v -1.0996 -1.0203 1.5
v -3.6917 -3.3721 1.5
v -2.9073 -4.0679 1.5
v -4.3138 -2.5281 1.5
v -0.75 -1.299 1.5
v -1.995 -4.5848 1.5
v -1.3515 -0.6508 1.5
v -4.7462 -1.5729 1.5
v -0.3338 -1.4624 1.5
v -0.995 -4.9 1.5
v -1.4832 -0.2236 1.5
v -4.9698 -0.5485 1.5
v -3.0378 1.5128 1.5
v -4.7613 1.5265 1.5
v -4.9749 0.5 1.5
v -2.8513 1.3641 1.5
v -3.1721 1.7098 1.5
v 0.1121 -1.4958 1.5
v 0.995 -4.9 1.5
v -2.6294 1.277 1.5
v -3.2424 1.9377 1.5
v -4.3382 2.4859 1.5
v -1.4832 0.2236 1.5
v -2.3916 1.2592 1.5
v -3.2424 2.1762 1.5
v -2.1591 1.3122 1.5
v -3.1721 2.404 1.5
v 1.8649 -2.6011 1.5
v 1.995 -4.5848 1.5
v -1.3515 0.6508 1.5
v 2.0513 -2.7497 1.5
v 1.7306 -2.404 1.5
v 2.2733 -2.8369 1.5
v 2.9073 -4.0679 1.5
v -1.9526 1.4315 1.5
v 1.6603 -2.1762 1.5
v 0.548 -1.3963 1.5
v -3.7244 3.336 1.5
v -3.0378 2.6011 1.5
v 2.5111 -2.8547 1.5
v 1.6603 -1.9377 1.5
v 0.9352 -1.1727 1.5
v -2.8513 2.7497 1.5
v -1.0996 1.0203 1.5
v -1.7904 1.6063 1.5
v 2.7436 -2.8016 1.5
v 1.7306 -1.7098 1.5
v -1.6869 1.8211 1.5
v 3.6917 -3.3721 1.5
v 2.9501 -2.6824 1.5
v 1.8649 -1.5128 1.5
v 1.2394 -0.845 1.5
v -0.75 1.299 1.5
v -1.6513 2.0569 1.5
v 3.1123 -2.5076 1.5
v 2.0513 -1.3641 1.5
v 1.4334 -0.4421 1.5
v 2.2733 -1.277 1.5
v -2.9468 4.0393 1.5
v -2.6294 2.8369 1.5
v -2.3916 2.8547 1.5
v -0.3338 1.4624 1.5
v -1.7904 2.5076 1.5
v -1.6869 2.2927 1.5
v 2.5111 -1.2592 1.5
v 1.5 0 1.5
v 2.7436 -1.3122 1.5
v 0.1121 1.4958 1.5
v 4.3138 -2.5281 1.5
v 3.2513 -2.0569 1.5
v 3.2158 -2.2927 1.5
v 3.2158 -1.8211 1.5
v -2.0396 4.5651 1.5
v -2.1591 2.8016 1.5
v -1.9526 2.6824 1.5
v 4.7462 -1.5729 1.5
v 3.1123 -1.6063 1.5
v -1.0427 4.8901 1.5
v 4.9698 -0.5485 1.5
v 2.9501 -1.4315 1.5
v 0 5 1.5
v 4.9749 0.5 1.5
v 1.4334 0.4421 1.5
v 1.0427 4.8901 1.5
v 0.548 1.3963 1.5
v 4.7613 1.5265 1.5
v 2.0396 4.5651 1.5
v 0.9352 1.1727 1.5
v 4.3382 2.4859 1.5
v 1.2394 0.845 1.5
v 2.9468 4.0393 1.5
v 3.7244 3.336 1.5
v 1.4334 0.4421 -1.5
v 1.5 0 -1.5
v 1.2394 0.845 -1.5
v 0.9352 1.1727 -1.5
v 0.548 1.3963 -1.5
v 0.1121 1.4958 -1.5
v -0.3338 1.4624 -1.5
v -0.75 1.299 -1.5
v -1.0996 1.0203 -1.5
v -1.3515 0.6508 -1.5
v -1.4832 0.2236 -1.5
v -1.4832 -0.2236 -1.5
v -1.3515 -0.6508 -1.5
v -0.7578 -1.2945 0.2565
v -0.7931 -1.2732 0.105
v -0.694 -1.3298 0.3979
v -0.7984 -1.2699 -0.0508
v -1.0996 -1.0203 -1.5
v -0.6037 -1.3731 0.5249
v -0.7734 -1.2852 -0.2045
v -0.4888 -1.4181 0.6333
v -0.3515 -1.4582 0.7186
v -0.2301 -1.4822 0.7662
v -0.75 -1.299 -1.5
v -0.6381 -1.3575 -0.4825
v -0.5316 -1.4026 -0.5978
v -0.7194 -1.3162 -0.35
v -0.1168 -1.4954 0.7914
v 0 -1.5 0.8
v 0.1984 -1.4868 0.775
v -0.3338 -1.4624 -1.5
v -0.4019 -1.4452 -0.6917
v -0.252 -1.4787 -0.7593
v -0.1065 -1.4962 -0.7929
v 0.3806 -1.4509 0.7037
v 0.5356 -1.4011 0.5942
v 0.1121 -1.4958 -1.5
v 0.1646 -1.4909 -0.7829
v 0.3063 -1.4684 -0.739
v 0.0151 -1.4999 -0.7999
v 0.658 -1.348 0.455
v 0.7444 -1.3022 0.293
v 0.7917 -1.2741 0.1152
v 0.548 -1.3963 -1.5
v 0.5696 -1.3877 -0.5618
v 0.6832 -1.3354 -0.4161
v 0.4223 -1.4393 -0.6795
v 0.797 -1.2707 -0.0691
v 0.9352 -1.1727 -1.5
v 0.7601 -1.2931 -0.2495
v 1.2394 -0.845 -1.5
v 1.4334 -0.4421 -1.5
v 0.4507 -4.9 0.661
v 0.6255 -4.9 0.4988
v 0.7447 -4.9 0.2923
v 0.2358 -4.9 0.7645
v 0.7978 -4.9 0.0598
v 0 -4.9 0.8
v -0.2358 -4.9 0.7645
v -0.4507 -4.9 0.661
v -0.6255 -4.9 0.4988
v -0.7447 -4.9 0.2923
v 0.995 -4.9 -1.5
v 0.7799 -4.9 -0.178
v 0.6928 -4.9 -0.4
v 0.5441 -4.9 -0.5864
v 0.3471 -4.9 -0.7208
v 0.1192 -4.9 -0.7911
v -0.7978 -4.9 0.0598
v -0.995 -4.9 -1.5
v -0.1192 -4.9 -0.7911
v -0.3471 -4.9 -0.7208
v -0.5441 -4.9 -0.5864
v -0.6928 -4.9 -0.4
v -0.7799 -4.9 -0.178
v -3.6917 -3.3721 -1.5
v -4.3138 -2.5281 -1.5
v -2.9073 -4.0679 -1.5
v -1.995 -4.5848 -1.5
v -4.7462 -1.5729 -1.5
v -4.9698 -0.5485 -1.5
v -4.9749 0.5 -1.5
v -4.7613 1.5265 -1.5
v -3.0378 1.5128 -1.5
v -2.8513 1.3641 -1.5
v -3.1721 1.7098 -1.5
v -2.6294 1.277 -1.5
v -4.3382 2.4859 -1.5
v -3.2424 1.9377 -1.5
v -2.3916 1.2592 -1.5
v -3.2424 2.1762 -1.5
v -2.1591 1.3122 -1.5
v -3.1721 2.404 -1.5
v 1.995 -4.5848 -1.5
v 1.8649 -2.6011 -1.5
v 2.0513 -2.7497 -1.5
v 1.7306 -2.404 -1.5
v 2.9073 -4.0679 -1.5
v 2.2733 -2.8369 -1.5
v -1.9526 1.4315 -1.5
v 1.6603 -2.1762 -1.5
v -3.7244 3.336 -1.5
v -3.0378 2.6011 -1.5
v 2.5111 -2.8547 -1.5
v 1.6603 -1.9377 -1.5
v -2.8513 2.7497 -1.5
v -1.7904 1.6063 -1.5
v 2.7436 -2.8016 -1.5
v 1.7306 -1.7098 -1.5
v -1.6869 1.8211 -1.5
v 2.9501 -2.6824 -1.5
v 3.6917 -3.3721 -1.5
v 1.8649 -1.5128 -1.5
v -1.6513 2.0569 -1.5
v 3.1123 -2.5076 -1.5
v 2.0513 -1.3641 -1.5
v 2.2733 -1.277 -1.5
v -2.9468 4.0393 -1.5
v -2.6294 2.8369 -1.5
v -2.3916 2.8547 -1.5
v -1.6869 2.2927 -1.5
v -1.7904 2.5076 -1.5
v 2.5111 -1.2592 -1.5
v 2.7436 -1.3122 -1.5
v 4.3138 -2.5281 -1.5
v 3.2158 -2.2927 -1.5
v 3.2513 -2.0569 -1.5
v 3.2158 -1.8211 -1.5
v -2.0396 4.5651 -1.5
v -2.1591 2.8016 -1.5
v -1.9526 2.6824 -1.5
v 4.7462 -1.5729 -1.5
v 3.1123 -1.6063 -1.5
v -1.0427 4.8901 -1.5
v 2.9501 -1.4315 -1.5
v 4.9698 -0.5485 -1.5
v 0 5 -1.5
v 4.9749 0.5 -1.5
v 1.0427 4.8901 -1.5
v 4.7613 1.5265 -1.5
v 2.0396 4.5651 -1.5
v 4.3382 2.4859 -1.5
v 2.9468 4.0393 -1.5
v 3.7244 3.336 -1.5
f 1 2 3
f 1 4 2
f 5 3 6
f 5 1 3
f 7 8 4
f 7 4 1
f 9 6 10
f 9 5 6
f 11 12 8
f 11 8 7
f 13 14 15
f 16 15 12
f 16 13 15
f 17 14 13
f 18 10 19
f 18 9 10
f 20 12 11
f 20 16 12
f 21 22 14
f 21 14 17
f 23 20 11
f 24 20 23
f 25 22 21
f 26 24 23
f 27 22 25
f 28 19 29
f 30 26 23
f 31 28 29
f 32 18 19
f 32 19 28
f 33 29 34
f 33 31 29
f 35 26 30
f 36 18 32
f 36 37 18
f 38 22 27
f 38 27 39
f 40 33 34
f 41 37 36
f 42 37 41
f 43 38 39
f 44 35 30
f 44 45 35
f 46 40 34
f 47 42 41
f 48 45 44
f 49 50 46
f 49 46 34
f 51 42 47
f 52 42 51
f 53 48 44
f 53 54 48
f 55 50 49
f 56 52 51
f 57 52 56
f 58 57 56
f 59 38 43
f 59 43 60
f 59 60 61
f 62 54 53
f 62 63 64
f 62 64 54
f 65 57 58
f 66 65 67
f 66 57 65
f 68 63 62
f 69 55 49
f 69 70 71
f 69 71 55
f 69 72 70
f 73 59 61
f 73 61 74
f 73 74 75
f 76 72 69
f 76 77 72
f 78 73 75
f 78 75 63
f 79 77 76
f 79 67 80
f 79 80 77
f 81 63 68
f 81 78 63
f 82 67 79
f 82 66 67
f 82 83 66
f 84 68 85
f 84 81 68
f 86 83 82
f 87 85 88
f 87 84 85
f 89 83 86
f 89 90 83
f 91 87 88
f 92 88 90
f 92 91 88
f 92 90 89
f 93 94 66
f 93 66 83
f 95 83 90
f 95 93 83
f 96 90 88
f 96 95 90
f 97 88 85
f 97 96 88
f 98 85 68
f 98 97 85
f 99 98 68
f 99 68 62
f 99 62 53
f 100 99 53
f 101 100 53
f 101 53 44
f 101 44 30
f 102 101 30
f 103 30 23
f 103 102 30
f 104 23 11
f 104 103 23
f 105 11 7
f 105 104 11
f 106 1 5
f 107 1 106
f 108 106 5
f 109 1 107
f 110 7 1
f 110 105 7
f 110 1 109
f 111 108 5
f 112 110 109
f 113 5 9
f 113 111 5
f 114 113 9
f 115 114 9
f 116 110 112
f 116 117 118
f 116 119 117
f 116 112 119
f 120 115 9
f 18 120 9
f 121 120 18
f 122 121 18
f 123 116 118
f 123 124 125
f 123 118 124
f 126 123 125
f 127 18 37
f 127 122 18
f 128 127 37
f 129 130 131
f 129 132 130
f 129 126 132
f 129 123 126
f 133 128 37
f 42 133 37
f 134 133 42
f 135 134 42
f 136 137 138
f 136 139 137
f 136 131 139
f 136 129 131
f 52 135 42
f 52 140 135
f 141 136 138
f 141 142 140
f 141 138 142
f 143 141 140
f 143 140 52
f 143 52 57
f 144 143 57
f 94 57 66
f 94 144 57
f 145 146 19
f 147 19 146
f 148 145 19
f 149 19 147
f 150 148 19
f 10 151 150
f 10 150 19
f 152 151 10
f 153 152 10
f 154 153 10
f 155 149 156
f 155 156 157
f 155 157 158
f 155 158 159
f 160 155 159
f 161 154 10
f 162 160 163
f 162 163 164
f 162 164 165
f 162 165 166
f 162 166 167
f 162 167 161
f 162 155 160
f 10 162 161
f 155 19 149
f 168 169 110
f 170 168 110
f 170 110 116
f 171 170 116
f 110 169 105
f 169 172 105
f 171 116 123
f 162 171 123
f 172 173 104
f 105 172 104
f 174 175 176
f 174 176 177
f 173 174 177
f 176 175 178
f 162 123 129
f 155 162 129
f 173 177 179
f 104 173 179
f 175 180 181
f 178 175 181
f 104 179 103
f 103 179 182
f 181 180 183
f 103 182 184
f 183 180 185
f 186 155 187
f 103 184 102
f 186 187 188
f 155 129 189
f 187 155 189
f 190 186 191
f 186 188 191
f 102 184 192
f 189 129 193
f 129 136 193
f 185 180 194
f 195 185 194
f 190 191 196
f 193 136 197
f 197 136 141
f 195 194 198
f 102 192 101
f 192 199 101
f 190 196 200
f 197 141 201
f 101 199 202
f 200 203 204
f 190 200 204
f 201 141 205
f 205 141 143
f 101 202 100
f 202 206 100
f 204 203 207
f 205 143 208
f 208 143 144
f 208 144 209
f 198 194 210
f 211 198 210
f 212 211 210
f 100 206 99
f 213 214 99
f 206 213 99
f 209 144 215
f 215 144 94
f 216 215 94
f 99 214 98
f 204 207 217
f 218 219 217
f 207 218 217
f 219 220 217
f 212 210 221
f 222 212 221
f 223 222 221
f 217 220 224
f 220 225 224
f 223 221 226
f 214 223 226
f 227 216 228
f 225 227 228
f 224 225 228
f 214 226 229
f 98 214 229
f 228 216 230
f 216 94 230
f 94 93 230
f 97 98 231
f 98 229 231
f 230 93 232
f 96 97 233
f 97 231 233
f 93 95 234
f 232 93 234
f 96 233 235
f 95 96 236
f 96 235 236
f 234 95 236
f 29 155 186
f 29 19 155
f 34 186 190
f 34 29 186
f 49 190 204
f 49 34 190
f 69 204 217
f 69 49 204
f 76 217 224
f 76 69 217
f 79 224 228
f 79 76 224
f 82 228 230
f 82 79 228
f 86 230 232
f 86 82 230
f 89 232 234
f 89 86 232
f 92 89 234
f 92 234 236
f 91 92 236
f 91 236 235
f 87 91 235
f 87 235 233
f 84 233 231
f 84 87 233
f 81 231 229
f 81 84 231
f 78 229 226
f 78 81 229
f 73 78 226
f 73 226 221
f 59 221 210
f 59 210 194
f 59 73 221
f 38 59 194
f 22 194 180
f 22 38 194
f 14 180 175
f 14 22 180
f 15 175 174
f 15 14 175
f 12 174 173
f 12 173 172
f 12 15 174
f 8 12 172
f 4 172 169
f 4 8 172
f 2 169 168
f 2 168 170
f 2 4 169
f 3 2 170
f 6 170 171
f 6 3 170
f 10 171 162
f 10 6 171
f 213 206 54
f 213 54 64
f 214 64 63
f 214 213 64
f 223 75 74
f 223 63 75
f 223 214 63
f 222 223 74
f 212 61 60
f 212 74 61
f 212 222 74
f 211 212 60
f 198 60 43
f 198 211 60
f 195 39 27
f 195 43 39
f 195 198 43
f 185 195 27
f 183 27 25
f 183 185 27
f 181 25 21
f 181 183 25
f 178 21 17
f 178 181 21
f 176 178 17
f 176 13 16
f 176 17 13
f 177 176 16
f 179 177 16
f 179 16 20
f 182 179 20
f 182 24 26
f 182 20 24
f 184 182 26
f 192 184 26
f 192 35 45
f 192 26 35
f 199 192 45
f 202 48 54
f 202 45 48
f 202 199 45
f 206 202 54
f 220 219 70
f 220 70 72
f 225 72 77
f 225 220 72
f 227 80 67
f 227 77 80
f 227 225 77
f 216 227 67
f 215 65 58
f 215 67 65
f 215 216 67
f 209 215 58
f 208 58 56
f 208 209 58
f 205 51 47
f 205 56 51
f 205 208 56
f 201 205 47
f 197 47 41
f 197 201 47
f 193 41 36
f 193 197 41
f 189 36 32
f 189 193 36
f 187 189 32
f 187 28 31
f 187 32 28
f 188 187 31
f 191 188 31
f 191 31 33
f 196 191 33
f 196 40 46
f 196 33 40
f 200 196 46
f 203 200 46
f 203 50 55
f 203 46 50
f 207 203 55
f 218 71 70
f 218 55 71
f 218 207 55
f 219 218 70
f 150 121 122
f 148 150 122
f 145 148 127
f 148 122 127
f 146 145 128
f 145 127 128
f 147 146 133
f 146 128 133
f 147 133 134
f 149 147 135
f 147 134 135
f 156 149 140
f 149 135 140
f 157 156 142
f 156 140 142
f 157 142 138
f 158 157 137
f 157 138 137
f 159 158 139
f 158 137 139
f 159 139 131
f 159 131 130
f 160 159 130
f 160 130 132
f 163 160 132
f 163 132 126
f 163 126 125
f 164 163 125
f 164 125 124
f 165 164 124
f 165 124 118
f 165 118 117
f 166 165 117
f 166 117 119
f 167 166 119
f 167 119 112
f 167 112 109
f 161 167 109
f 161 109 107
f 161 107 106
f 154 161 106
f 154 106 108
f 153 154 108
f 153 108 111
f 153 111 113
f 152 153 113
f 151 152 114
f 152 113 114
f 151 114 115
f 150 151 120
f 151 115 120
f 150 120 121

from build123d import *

# Parameters (mm, degrees)
SKETCH1_R           = 5
SKETCH1_R_2         = 1.5
EXTRUDE1_DEPTH      = 1.5
EXTRUDE2_DEPTH      = 8.228416147
EXTRUDE2_DEPTH_BACK = 8.228416147
SKETCH2_R           = 0.8
SKETCH3_R           = 0.8
EXTRUDE3_DEPTH      = 8.228416147
EXTRUDE4_DEPTH      = 8.228416306
EXTRUDE4_DEPTH_BACK = 8.228416306
SKETCH4_W           = 4.205463009
SKETCH4_H           = 0.572765835
SKETCH4_W_2         = 4.092184544


with BuildPart() as part:
    # Sketch1 → Extrude1 (new, symmetric)
    with BuildSketch(Plane.XY):
        Circle(SKETCH1_R)
        Circle(SKETCH1_R_2, mode=Mode.SUBTRACT)
    extrude(amount=EXTRUDE1_DEPTH, both=True)

    # Sketch2 → Extrude2 (cut, two sides: drawn at the far end of the back side and taken through both)
    with BuildSketch(Plane.XY.offset(-EXTRUDE2_DEPTH_BACK)):
        with Locations((-2.451342218, 2.056920351)):
            Circle(SKETCH2_R)
        with Locations((2.451342218, -2.056920351)):
            Circle(SKETCH2_R)
    extrude(amount=EXTRUDE2_DEPTH + EXTRUDE2_DEPTH_BACK, mode=Mode.SUBTRACT)

    # Sketch3 → Extrude3 (cut, through all)
    with BuildSketch(Plane(origin=(0, 0, 0), x_dir=(1, 0, 0), z_dir=(0, 1, 0))):
        with Locations(Location((0, 0, 0), (0, 0, 270))):
            Circle(SKETCH3_R)
    extrude(amount=-EXTRUDE3_DEPTH, mode=Mode.SUBTRACT)

    # Sketch4 → Extrude4 (cut, two sides: drawn at the far end of the back side and taken through both)
    with BuildSketch(Plane.XY.offset(-EXTRUDE4_DEPTH_BACK)):
        with Locations((-2.102731505, -5.186382918)):
            Rectangle(SKETCH4_W, SKETCH4_H)
        with Locations((2.046092272, -5.186382918)):
            Rectangle(SKETCH4_W_2, SKETCH4_H)
    extrude(amount=EXTRUDE4_DEPTH + EXTRUDE4_DEPTH_BACK, mode=Mode.SUBTRACT)


solid = part.part
